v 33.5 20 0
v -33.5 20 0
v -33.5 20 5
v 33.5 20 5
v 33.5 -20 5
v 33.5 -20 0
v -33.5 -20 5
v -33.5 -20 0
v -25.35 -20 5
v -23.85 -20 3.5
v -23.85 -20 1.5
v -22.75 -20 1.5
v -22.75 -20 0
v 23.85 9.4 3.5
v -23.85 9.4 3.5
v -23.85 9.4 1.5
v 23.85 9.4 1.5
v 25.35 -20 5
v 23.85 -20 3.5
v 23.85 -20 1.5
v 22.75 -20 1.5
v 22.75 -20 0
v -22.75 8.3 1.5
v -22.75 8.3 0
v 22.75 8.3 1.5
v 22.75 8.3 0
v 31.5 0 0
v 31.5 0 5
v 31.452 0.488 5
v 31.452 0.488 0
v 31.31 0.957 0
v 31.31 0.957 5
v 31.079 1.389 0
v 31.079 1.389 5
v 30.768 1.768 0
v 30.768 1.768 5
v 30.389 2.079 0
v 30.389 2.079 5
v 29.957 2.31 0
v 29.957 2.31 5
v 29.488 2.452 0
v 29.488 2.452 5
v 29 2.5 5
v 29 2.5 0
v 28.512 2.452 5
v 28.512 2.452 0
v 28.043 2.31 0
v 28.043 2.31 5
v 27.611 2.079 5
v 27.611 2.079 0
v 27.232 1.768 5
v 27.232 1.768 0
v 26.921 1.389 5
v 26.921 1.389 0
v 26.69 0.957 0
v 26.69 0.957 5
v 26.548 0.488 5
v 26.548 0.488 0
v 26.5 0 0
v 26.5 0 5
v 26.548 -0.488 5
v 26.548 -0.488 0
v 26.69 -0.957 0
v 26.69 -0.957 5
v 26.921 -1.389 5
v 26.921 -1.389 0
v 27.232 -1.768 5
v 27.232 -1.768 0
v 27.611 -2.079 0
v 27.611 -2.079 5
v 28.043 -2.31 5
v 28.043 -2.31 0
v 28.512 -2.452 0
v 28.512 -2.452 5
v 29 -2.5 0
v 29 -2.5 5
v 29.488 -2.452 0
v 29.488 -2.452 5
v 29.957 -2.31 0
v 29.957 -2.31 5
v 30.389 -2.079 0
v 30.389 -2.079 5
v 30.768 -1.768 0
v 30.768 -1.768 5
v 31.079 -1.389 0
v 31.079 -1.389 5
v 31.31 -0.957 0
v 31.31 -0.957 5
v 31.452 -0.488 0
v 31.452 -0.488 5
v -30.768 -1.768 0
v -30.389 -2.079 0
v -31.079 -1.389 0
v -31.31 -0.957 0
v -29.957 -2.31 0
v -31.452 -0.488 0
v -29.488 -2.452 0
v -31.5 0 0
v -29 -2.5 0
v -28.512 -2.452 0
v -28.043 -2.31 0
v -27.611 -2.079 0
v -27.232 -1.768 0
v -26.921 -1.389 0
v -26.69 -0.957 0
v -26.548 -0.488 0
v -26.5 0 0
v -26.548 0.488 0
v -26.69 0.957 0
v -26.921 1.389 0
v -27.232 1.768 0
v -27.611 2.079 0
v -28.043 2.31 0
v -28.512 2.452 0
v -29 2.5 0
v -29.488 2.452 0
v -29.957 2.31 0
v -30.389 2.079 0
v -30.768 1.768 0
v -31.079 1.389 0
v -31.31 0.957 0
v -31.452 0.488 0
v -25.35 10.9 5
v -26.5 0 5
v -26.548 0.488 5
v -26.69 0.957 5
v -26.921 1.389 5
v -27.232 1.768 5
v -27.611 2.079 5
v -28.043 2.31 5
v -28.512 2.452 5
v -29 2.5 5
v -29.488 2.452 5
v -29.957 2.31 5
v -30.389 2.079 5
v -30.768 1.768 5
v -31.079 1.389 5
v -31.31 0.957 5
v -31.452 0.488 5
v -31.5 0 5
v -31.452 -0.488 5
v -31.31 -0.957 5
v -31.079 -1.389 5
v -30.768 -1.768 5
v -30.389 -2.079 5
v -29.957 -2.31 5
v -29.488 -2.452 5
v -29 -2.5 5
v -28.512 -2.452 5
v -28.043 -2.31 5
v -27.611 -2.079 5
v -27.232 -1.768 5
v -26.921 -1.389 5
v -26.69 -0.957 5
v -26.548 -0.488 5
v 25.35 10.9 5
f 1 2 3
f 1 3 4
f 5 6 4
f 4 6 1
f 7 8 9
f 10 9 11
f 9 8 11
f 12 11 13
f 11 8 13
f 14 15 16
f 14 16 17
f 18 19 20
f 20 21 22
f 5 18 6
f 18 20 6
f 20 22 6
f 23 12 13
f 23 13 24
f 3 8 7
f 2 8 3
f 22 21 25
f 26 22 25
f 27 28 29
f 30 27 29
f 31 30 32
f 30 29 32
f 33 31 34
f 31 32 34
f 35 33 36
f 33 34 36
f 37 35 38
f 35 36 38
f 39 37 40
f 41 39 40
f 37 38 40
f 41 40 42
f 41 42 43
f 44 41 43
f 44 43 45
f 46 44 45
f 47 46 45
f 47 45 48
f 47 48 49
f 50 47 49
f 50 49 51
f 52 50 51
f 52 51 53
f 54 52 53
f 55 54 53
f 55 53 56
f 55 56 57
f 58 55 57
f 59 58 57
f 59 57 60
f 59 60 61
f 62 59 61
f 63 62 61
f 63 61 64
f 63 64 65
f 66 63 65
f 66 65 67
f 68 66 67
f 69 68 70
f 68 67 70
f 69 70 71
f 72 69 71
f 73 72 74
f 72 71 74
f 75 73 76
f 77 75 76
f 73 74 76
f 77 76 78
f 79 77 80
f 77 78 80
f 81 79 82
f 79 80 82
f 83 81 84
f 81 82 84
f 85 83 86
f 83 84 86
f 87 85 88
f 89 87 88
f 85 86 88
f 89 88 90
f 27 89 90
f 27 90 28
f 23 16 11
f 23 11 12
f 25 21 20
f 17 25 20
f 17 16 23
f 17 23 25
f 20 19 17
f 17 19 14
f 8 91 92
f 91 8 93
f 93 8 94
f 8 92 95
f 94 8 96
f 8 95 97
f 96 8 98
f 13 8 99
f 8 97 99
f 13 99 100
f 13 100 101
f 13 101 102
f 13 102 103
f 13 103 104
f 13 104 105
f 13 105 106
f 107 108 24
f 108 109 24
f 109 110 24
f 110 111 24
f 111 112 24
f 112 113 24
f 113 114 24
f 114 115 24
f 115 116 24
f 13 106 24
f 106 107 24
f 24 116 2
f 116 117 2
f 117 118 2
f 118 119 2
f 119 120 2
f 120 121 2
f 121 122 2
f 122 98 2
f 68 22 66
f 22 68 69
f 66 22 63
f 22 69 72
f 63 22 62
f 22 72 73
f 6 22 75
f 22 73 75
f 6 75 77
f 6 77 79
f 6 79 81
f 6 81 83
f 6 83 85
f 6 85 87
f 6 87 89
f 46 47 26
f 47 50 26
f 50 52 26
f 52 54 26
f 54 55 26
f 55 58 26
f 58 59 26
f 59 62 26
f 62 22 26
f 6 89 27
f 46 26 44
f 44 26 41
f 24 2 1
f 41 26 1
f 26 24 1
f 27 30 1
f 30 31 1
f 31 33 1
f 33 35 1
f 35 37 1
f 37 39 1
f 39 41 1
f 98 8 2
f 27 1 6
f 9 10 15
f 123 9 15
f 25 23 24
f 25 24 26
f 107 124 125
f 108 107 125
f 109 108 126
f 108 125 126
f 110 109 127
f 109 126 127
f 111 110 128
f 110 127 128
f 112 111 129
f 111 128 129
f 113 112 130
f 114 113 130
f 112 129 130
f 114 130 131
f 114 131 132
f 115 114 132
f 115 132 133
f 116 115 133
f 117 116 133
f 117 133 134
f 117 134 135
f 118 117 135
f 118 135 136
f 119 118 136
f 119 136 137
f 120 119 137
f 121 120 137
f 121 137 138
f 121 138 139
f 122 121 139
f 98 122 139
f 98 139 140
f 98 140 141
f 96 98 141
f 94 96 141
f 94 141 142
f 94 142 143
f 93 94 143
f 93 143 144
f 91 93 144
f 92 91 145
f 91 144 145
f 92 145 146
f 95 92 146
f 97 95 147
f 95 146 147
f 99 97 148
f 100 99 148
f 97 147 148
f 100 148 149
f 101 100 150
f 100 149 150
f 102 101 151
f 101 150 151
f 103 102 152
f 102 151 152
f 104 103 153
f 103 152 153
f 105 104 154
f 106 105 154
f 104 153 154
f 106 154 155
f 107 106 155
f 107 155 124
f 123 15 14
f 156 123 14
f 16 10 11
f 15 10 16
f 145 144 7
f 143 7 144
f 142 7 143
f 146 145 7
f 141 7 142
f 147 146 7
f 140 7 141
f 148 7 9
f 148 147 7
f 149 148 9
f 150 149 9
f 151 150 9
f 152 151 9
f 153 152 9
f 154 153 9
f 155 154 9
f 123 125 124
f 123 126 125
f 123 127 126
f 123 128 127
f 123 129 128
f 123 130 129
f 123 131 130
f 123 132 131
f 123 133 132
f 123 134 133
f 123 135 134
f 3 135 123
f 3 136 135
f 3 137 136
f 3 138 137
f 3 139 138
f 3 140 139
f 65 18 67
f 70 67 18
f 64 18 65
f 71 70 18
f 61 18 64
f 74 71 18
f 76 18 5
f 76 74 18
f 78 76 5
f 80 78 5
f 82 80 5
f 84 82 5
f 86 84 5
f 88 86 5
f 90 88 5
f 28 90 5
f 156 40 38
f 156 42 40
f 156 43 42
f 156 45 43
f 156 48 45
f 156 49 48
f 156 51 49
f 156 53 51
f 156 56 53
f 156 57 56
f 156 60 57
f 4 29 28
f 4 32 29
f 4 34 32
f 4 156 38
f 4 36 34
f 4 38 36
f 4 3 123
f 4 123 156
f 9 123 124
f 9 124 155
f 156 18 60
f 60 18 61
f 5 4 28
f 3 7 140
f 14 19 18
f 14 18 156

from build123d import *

# Parameters (mm, degrees)
SKETCH_W        = 67
SKETCH_H        = 40
PAD_DEPTH       = 5
SKETCH001_W     = 45.5
SKETCH001_H     = 28.3
POCKET_DEPTH    = 5.001
SKETCH002_W     = 47.7
SKETCH002_H     = 29.4
POCKET001_DEPTH = 3.5
SKETCH003_R     = 2.5
POCKET002_DEPTH = 5.001
CHAMFER_SIZE    = 1.5


with BuildPart() as part:
    # Sketch → Pad (new body)
    with BuildSketch(Plane.XY):
        Rectangle(SKETCH_W, SKETCH_H)
    extrude(amount=PAD_DEPTH)

    # Sketch001 (on Face6 of Pad) → Pocket (cut, through all)
    with BuildSketch(Plane.XY.offset(5)):
        with Locations((0, -5.85)):
            Rectangle(SKETCH001_W, SKETCH001_H)
    extrude(amount=-POCKET_DEPTH, mode=Mode.SUBTRACT)

    # Sketch002 (on Face5 of Pocket) → Pocket001 (cut)
    with BuildSketch(Plane.XY.offset(5)):
        with Locations((0, -5.3)):
            Rectangle(SKETCH002_W, SKETCH002_H)
    extrude(amount=-POCKET001_DEPTH, mode=Mode.SUBTRACT)

    # Sketch003 (on Face5 of Pocket001) → Pocket002 (cut, through all)
    with BuildSketch(Plane.XY.offset(5)):
        with Locations((29, 0)):
            Circle(SKETCH003_R)
        with Locations((-29, 0)):
            Circle(SKETCH003_R)
    extrude(amount=-POCKET002_DEPTH, mode=Mode.SUBTRACT)

    # Chamfer
    chamfer_edges = [part.edges().sort_by_distance(p)[0] for p in [
        (0, 9.4, 5),
        (-23.85, -5.3, 5),
        (23.85, -5.3, 5),
    ]]
    chamfer(chamfer_edges, length=CHAMFER_SIZE)


solid = part.part
